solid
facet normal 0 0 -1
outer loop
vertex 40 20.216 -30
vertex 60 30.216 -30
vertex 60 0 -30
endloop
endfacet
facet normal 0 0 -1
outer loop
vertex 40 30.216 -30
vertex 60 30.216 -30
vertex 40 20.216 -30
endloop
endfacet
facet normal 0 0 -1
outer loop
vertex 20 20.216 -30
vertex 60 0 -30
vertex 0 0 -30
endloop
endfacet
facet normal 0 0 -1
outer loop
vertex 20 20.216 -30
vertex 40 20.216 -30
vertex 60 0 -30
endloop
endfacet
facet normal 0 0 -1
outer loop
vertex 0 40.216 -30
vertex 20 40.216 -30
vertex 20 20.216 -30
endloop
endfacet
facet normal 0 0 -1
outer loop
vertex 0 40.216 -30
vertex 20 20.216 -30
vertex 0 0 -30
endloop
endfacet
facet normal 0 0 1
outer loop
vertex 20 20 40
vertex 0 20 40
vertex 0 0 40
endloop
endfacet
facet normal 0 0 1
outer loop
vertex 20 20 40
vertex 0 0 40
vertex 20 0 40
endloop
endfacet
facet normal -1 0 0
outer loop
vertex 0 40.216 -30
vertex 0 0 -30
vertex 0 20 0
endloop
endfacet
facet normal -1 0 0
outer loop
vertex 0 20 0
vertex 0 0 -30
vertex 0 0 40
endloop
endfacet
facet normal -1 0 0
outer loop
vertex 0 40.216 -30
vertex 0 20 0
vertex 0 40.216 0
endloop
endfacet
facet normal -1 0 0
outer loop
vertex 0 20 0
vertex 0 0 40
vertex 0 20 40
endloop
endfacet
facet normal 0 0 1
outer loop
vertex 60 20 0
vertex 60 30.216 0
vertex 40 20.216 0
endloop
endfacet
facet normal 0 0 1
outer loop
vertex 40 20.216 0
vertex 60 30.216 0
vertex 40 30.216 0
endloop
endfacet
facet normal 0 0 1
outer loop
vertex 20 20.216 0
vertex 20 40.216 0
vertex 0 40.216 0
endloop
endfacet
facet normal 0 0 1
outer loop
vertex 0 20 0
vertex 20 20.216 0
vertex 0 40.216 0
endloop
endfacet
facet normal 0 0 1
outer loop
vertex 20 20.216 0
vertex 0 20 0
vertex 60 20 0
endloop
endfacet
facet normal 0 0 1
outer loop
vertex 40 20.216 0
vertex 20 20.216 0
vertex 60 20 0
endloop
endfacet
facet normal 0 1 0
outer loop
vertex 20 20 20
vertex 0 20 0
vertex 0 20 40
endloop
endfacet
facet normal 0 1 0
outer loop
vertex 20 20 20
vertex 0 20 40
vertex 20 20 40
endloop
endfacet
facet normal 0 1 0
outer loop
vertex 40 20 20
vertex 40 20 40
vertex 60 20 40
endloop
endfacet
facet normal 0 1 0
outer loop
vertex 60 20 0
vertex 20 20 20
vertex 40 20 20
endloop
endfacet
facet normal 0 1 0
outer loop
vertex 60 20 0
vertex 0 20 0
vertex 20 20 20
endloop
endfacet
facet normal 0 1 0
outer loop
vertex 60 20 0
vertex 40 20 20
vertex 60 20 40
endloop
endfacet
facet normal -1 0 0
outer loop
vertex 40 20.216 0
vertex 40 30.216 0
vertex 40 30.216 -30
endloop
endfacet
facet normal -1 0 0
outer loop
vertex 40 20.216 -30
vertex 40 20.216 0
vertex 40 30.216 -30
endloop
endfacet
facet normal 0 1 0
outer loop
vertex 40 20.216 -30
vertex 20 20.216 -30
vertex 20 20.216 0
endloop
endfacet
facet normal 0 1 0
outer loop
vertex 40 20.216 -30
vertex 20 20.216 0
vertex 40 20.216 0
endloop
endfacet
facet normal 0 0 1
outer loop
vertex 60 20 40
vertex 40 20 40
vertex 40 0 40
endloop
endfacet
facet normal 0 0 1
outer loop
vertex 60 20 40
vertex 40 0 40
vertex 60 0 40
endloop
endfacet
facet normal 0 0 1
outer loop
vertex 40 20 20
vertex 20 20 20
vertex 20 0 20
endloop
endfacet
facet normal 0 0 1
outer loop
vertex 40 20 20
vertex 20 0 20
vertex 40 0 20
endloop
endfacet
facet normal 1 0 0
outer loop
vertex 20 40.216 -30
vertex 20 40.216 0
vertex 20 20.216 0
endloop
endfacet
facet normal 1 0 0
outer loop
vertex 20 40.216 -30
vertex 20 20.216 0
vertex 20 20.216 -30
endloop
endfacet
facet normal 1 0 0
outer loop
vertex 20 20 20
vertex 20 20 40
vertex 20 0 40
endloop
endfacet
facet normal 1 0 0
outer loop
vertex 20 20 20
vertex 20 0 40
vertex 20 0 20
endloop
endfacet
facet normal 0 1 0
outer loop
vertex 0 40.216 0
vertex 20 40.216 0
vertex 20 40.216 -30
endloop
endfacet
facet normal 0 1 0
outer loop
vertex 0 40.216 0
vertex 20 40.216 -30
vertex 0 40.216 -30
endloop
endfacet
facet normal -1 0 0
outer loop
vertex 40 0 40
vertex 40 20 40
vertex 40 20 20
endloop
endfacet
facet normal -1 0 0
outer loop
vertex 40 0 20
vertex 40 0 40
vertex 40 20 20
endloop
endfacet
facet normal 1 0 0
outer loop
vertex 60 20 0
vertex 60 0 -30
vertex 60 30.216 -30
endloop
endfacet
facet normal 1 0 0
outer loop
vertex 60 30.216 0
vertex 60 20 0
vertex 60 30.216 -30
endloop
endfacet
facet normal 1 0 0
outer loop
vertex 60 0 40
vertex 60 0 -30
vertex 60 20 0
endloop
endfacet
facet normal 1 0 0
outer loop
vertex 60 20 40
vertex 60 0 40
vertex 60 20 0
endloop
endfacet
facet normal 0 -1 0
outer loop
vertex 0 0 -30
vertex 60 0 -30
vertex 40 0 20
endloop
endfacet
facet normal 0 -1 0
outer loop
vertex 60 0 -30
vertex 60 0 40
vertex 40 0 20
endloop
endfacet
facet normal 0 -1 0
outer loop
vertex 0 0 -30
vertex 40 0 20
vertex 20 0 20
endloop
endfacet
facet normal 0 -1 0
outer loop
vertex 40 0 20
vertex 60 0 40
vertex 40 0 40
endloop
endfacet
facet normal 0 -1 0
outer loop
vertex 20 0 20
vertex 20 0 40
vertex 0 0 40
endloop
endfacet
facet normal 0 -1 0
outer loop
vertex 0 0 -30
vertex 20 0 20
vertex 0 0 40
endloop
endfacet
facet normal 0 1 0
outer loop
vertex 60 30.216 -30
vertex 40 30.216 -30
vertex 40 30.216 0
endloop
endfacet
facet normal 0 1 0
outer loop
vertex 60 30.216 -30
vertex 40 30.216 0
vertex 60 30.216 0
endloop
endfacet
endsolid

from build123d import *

# Parameters (mm, degrees)
ESBO_O1_W                = 60
ESBO_O1_H                = 20
RESSALTO_EXTRUS_O1_DEPTH = 40
ESBO_O2_W                = 20
ESBO_O2_H                = 20
CORTE_EXTRUS_O1_DEPTH    = 40
ESBO_O3_W                = 60
ESBO_O3_H                = 40.21646748
RESSALTO_EXTRUS_O2_DEPTH = 30
ESBO_O4_W                = 20
ESBO_O4_H                = 30
CORTE_EXTRUS_O4_DEPTH    = 20
ESBO_O7_W                = 20
ESBO_O7_H                = 30
CORTE_EXTRUS_O6_DEPTH    = 10


with BuildPart() as part:
    # Esboço1 → Ressalto-extrusão1 (new body)
    with BuildSketch(Plane.XY):
        with Locations((30, 10)):
            Rectangle(ESBO_O1_W, ESBO_O1_H)
    extrude(amount=RESSALTO_EXTRUS_O1_DEPTH)

    # Esboço2 → Corte-extrusão1 (cut)
    with BuildSketch(Plane(origin=(0, 20, 0), x_dir=(1, 0, 0), z_dir=(0, 1, 0))):
        with Locations((30, -30)):
            Rectangle(ESBO_O2_W, ESBO_O2_H)
    extrude(amount=-CORTE_EXTRUS_O1_DEPTH, mode=Mode.SUBTRACT)

    # Esboço3 → Ressalto-extrusão2 (add)
    with BuildSketch(Plane(origin=(0, 0, 0), x_dir=(-1, 0, 0), z_dir=(0, 0, -1))):
        with Locations((-30, 20.10823374)):
            Rectangle(ESBO_O3_W, ESBO_O3_H)
    extrude(amount=RESSALTO_EXTRUS_O2_DEPTH)

    # Esboço4 → Corte-extrusão4 (cut)
    with BuildSketch(Plane(origin=(0, 40.21646748, 0), x_dir=(1, 0, 0), z_dir=(0, 1, 0))):
        with Locations((30, 15)):
            Rectangle(ESBO_O4_W, ESBO_O4_H)
    extrude(amount=-CORTE_EXTRUS_O4_DEPTH, mode=Mode.SUBTRACT)

    # Esboço7 → Corte-extrusão6 (cut)
    with BuildSketch(Plane(origin=(0, 40.21646748, 0), x_dir=(1, 0, 0), z_dir=(0, 1, 0))):
        with Locations((50, 15)):
            Rectangle(ESBO_O7_W, ESBO_O7_H)
    extrude(amount=-CORTE_EXTRUS_O6_DEPTH, mode=Mode.SUBTRACT)


solid = part.part
